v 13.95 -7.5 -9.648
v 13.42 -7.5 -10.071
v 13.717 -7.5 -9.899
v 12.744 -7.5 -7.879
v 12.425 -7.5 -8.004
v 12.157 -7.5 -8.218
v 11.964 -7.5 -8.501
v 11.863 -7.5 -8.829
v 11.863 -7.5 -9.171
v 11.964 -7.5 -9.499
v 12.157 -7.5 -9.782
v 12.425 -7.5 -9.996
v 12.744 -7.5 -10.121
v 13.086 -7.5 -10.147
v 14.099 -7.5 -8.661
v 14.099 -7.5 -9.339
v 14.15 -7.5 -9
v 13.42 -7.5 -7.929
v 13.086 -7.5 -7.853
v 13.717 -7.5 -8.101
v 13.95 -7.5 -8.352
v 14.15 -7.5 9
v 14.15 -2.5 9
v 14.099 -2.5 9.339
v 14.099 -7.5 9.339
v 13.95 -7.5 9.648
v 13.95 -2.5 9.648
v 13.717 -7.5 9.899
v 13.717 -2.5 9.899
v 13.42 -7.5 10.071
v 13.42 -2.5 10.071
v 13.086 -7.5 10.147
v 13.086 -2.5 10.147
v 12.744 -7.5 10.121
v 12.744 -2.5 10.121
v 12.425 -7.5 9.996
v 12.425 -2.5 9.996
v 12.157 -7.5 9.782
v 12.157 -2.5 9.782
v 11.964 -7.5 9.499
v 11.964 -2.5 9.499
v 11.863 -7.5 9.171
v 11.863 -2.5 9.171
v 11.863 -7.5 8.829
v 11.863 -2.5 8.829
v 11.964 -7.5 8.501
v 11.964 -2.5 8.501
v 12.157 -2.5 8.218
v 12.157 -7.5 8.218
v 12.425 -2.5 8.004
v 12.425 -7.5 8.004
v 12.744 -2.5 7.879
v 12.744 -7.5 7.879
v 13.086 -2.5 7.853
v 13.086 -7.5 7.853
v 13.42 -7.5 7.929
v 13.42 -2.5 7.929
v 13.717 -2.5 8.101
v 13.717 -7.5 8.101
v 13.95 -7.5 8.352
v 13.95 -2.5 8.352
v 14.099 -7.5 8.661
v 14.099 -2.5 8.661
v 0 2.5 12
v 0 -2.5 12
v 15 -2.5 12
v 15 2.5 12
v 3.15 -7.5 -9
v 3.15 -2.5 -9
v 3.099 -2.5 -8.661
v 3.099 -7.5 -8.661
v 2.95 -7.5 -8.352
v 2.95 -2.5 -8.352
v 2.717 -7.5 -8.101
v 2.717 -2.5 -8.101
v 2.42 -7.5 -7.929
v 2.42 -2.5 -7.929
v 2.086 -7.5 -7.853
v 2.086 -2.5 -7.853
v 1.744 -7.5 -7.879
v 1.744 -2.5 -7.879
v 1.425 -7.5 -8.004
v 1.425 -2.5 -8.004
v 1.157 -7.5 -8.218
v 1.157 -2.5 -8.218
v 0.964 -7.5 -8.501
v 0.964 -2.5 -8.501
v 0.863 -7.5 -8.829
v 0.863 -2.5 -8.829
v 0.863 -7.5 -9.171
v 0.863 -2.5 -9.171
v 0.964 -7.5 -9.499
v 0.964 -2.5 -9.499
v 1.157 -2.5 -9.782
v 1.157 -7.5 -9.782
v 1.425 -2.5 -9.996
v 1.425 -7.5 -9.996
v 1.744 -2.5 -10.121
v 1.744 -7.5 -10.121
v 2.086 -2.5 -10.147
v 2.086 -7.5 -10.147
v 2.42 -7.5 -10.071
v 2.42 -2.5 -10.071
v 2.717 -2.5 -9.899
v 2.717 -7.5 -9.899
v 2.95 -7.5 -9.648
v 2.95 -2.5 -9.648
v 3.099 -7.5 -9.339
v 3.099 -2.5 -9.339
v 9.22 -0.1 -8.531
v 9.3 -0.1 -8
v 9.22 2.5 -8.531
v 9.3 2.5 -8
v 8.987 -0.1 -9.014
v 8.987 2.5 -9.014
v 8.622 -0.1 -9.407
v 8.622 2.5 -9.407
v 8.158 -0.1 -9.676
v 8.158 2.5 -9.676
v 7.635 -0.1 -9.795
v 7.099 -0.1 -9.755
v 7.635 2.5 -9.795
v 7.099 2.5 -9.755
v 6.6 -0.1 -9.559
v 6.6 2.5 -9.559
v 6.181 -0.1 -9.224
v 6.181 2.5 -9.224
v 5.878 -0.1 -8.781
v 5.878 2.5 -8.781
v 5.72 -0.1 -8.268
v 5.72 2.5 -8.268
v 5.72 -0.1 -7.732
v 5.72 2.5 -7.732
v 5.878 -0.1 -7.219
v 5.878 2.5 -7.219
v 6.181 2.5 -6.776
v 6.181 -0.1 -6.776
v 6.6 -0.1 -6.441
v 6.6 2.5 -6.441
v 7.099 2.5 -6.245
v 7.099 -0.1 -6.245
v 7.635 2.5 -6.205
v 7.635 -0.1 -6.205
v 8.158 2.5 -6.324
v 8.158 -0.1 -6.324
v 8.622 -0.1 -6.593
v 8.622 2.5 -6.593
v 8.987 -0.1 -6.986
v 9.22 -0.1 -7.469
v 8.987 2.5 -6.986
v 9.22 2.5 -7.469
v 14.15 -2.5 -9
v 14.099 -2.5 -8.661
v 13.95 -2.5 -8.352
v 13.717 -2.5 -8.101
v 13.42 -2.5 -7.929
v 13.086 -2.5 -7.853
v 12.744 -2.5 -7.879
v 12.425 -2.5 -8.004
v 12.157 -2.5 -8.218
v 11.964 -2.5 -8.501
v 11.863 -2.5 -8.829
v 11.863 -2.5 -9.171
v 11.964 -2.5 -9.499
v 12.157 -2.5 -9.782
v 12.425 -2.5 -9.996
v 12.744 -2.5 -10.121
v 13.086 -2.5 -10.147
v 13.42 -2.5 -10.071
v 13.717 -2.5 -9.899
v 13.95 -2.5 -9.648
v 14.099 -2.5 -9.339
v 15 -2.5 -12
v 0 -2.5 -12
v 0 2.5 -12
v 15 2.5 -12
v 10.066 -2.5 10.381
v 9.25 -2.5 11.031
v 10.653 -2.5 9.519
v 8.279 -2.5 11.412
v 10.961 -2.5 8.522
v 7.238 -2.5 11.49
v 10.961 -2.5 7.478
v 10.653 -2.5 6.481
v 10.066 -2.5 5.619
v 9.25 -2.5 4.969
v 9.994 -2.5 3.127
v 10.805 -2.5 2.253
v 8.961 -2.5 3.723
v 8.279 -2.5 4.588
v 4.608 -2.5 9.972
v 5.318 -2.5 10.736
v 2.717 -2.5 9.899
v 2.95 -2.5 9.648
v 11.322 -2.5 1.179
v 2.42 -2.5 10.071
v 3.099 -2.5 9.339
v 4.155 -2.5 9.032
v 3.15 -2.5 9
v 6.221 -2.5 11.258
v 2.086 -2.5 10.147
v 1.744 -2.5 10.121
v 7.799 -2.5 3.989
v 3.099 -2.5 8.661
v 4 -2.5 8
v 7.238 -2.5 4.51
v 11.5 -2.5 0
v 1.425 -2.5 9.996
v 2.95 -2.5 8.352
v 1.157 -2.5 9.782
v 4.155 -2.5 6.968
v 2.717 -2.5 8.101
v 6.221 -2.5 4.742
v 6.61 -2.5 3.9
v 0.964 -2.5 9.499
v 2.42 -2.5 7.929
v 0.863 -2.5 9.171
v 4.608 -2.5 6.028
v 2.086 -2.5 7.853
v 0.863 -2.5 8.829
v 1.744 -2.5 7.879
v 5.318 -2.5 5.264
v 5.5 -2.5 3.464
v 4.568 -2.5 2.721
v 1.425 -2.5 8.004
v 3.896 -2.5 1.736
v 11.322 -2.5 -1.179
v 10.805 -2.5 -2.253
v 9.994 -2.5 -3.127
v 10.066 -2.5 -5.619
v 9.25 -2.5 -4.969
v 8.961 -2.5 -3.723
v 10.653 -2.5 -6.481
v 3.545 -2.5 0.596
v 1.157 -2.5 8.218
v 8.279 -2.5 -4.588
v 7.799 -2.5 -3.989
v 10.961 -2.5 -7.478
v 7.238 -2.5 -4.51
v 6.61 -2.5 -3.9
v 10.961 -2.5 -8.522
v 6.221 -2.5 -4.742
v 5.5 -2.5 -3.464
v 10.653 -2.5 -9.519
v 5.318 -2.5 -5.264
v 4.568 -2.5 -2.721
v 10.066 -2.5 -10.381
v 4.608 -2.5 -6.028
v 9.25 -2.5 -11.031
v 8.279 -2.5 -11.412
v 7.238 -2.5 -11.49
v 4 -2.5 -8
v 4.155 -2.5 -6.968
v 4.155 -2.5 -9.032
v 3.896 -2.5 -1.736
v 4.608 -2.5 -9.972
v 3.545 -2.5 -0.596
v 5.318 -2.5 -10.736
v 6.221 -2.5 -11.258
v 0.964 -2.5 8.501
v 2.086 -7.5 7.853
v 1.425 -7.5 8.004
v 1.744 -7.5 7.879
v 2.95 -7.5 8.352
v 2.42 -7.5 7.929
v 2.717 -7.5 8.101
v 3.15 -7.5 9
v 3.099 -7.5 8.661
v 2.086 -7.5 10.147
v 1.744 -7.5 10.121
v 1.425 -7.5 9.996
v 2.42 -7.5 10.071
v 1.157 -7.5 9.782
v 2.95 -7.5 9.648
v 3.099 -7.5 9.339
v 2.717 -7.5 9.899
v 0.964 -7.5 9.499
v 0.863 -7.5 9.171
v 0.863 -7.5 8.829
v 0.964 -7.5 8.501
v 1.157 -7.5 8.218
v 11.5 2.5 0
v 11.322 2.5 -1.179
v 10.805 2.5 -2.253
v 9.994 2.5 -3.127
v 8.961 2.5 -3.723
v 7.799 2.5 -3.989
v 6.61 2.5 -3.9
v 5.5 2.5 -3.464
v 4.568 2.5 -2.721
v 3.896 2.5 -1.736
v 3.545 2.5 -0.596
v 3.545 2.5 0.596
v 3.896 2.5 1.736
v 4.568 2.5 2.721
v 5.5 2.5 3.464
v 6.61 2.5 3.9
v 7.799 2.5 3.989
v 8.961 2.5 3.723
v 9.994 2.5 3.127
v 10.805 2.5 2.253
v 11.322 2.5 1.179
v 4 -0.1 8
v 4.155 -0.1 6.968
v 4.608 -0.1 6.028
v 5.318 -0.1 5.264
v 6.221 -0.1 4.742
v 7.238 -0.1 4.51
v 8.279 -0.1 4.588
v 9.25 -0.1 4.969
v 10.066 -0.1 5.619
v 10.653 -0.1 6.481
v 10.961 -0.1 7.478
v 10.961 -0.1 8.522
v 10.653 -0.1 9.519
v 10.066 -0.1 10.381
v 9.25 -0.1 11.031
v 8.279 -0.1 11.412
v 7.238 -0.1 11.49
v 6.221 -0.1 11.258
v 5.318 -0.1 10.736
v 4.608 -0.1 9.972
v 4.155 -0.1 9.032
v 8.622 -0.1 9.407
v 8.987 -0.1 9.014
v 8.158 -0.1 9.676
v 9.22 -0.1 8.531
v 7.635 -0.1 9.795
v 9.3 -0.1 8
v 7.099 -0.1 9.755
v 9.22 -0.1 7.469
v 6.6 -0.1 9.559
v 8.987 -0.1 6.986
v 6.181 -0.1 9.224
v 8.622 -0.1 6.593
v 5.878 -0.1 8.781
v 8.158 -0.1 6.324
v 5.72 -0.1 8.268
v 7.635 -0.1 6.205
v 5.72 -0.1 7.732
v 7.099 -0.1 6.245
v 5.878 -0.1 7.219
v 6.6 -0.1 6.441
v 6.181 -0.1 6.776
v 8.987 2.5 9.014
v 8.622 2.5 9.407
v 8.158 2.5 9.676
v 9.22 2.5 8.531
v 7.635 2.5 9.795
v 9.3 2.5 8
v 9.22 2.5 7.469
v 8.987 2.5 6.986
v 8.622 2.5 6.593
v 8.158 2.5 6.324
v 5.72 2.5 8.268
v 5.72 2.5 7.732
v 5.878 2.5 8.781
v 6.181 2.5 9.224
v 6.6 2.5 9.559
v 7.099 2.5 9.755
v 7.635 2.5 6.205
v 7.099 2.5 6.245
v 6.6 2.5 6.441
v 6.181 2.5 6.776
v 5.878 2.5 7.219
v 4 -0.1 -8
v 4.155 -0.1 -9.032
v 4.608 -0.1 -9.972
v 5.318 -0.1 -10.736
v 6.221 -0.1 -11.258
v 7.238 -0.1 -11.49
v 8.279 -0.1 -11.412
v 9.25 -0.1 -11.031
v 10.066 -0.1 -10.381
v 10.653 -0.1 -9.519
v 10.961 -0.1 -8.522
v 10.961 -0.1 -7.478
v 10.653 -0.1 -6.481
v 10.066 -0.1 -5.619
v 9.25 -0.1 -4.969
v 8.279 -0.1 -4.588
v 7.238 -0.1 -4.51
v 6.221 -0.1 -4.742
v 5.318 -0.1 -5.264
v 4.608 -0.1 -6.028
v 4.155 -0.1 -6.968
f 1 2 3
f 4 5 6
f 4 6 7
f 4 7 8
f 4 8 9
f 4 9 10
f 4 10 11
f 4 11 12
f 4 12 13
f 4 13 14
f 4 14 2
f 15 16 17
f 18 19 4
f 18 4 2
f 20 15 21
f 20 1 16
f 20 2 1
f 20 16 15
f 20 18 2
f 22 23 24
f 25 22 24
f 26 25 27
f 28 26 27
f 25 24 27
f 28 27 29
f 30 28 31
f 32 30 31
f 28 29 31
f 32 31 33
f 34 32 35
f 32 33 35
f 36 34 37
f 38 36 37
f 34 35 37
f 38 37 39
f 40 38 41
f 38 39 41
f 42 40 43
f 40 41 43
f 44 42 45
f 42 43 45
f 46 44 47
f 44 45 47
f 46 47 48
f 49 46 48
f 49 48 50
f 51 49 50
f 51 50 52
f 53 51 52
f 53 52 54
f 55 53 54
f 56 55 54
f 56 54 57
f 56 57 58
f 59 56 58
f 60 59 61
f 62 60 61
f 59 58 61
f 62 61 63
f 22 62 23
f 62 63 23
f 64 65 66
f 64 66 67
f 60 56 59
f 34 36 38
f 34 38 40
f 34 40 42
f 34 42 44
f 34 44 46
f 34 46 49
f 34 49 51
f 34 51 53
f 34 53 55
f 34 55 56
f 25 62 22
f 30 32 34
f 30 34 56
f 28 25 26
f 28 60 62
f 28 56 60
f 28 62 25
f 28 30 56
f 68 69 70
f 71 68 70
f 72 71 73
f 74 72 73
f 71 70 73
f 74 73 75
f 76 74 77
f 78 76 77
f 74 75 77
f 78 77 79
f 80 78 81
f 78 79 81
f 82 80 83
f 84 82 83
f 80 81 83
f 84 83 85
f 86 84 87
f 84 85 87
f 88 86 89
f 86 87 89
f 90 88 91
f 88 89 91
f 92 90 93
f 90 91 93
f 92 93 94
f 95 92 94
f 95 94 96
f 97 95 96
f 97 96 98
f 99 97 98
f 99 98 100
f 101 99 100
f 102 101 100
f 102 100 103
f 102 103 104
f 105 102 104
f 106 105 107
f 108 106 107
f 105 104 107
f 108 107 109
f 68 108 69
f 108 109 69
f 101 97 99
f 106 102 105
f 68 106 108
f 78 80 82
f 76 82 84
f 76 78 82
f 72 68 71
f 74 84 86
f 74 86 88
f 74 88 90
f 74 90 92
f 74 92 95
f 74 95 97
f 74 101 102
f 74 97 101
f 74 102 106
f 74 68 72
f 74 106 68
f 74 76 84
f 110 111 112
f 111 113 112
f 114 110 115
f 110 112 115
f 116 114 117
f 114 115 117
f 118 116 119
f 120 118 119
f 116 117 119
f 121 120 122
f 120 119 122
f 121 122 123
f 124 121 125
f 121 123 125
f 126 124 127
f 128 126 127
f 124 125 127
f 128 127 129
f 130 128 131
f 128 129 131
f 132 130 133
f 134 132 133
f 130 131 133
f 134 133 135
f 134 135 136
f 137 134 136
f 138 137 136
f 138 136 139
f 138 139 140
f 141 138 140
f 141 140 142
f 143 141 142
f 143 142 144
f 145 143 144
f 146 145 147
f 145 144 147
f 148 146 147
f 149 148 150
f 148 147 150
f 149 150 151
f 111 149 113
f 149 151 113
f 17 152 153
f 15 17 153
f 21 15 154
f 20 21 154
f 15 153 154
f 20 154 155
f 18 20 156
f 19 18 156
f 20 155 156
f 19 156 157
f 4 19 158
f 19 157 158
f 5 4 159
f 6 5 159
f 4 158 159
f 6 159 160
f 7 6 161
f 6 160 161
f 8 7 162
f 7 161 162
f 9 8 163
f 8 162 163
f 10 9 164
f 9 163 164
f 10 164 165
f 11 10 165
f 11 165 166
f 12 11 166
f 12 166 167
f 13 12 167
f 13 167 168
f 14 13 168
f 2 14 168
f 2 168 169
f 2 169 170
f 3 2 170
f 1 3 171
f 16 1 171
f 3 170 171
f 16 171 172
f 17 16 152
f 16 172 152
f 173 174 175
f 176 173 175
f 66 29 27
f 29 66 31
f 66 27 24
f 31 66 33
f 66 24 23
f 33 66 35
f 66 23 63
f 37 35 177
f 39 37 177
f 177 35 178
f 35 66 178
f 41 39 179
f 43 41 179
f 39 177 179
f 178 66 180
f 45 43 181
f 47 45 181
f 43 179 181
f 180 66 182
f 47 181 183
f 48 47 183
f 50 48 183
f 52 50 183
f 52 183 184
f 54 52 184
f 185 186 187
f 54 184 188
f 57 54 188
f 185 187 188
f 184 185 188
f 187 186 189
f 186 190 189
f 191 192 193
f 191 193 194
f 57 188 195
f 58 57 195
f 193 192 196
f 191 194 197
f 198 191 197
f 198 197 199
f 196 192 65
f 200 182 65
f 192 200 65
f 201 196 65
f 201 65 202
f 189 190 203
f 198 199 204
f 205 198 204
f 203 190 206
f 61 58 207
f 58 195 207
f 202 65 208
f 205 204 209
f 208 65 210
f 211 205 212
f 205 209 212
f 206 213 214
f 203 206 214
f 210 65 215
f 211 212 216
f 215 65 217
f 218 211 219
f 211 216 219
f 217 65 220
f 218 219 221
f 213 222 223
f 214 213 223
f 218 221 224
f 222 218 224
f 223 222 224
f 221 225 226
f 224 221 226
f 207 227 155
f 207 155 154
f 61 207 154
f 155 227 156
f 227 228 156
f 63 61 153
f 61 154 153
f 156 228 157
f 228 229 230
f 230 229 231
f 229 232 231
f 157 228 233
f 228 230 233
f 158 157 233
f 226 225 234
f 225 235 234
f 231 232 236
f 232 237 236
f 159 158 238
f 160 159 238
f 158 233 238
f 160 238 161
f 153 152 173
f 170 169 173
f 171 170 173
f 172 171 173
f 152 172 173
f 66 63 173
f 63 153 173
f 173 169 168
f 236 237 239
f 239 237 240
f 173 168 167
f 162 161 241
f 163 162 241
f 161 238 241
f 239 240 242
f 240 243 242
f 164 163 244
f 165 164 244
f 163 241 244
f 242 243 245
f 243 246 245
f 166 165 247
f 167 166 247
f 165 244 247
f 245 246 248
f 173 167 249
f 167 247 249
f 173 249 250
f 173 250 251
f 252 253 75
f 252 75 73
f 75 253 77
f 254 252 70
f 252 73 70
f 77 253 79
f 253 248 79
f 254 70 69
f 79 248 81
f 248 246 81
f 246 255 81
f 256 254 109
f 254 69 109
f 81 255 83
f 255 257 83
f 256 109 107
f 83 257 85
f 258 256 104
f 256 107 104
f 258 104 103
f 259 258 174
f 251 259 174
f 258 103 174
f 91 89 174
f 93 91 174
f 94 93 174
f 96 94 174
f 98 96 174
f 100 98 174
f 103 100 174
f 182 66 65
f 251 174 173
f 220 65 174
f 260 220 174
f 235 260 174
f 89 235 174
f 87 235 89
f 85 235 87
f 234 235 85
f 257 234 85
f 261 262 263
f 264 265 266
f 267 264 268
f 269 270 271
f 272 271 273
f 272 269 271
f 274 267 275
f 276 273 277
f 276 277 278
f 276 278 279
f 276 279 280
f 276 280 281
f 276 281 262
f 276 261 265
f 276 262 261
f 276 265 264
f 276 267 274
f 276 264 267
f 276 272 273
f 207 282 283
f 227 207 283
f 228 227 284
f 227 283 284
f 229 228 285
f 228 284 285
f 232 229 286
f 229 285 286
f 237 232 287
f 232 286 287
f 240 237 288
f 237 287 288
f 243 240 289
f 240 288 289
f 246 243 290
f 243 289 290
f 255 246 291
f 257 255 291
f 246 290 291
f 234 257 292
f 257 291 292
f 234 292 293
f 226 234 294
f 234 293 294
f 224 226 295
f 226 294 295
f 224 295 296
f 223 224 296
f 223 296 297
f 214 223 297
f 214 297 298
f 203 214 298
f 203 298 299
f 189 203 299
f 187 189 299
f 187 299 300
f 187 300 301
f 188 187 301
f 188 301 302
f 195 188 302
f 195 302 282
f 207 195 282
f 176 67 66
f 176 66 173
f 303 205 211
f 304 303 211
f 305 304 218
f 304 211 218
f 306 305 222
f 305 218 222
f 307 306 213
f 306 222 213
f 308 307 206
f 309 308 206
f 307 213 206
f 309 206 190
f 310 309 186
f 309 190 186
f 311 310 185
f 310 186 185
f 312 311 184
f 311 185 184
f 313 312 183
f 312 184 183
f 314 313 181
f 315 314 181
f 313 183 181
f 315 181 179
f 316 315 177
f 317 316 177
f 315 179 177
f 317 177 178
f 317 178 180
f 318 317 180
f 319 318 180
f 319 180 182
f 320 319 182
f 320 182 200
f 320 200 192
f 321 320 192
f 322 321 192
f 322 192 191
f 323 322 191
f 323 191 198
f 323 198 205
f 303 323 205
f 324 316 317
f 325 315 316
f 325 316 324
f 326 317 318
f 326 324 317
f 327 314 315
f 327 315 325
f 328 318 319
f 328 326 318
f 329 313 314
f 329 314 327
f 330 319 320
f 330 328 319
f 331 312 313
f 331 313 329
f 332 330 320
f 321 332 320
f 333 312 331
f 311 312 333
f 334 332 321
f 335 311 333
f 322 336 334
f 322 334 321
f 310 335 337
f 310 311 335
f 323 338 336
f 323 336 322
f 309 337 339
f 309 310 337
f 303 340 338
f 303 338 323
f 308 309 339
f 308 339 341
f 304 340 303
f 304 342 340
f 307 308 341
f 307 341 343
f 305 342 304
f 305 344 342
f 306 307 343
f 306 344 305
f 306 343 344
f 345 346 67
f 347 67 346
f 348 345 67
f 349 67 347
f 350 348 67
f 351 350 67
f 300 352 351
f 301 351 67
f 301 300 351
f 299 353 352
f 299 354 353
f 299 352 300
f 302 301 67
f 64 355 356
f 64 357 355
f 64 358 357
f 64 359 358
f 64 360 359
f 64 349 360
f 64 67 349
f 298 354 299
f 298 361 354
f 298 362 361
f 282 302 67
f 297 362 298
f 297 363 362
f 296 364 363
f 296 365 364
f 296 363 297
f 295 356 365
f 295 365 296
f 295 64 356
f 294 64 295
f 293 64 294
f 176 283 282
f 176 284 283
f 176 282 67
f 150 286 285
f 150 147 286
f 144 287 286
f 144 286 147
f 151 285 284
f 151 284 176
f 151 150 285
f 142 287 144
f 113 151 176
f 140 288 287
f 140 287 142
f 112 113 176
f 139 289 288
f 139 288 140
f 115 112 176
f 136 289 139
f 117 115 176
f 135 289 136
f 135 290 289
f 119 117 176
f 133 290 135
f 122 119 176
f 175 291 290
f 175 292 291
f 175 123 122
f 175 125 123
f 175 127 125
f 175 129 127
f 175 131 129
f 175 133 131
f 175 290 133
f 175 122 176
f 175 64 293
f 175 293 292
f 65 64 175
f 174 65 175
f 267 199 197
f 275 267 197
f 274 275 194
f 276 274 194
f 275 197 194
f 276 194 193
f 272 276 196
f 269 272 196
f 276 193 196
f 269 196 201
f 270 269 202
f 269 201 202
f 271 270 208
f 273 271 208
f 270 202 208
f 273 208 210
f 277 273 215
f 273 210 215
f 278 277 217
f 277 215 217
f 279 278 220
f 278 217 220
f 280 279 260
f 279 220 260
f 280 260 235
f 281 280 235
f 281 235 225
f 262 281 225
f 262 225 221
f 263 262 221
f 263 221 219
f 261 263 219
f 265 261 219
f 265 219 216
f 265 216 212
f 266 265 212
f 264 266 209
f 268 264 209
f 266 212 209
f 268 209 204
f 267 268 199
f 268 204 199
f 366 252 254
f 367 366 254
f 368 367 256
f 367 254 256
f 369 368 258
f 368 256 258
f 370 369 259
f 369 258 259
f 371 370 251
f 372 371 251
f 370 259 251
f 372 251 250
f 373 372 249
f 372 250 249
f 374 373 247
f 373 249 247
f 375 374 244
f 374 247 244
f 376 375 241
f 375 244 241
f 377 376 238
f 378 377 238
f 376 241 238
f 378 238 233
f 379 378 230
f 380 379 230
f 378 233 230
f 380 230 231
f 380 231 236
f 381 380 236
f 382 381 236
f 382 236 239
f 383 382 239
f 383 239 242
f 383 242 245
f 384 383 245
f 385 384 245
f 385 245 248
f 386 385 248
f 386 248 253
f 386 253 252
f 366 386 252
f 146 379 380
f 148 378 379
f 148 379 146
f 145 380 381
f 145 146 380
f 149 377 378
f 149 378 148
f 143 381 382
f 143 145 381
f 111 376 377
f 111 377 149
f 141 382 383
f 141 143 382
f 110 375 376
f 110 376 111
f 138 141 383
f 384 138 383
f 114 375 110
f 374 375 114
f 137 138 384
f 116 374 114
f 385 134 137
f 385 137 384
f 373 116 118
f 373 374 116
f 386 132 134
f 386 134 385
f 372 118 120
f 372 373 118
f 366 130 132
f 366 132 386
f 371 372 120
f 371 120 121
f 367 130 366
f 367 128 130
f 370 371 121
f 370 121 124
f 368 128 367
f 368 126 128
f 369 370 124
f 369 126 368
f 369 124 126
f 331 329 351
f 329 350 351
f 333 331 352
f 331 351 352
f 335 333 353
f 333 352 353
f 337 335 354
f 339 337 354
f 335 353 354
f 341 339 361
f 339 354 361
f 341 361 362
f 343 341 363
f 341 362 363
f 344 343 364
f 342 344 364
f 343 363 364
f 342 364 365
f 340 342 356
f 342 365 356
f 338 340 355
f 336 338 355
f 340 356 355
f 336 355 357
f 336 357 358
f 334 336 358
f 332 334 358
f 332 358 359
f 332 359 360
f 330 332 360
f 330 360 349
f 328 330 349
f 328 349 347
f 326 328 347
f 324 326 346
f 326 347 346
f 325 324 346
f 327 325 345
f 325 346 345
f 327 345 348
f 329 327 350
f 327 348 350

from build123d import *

# Parameters (mm, degrees)
SKETCH1_W                                = 24
SKETCH1_H                                = 5
BOSS_EXTRUDE1_DEPTH                      = 15
SKETCH2_R                                = 1.15
BOSS_EXTRUDE2_DEPTH                      = 5
SKETCH4_R                                = 4
CUT_EXTRUDE1_DEPTH                       = 11
CBORE_FOR_M3_PAN_HEAD_SCREW1_D           = 3.6
CBORE_FOR_M3_PAN_HEAD_SCREW1_CBORE_D     = 7
CBORE_FOR_M3_PAN_HEAD_SCREW1_CBORE_DEPTH = 2.4


with BuildPart() as part:
    # Sketch1 → Boss-Extrude1 (new body)
    with BuildSketch(Plane(origin=(0, 0, 0), x_dir=(0, 0, -1), z_dir=(1, 0, 0))):
        Rectangle(SKETCH1_W, SKETCH1_H)
    extrude(amount=BOSS_EXTRUDE1_DEPTH)

    # Sketch2 → Boss-Extrude2 (add)
    with BuildSketch(Plane.XZ.offset(2.5)):
        with Locations((2, 9)):
            Circle(SKETCH2_R)
        with Locations((13, 9)):
            Circle(SKETCH2_R)
        with Locations((13, -9)):
            Circle(SKETCH2_R)
        with Locations((2, -9)):
            Circle(SKETCH2_R)
    extrude(amount=BOSS_EXTRUDE2_DEPTH)

    # Sketch4 → Cut-Extrude1 (cut, through all)
    with BuildSketch(Plane(origin=(0, 2.5, 0), x_dir=(1, 0, 0), z_dir=(0, 1, 0))):
        with Locations((7.5, 0)):
            Circle(SKETCH4_R)
    extrude(amount=-CUT_EXTRUDE1_DEPTH, mode=Mode.SUBTRACT)

    # CBORE for M3 Pan Head Screw1 (through all)
    with Locations(Plane(origin=(0, -2.5, 0), x_dir=(-1, 0, 0), z_dir=(0, -1, 0))):
        with Locations((-7.5, 8), (-7.5, -8)):
            CounterBoreHole(CBORE_FOR_M3_PAN_HEAD_SCREW1_D / 2, CBORE_FOR_M3_PAN_HEAD_SCREW1_CBORE_D / 2, CBORE_FOR_M3_PAN_HEAD_SCREW1_CBORE_DEPTH)


solid = part.part
